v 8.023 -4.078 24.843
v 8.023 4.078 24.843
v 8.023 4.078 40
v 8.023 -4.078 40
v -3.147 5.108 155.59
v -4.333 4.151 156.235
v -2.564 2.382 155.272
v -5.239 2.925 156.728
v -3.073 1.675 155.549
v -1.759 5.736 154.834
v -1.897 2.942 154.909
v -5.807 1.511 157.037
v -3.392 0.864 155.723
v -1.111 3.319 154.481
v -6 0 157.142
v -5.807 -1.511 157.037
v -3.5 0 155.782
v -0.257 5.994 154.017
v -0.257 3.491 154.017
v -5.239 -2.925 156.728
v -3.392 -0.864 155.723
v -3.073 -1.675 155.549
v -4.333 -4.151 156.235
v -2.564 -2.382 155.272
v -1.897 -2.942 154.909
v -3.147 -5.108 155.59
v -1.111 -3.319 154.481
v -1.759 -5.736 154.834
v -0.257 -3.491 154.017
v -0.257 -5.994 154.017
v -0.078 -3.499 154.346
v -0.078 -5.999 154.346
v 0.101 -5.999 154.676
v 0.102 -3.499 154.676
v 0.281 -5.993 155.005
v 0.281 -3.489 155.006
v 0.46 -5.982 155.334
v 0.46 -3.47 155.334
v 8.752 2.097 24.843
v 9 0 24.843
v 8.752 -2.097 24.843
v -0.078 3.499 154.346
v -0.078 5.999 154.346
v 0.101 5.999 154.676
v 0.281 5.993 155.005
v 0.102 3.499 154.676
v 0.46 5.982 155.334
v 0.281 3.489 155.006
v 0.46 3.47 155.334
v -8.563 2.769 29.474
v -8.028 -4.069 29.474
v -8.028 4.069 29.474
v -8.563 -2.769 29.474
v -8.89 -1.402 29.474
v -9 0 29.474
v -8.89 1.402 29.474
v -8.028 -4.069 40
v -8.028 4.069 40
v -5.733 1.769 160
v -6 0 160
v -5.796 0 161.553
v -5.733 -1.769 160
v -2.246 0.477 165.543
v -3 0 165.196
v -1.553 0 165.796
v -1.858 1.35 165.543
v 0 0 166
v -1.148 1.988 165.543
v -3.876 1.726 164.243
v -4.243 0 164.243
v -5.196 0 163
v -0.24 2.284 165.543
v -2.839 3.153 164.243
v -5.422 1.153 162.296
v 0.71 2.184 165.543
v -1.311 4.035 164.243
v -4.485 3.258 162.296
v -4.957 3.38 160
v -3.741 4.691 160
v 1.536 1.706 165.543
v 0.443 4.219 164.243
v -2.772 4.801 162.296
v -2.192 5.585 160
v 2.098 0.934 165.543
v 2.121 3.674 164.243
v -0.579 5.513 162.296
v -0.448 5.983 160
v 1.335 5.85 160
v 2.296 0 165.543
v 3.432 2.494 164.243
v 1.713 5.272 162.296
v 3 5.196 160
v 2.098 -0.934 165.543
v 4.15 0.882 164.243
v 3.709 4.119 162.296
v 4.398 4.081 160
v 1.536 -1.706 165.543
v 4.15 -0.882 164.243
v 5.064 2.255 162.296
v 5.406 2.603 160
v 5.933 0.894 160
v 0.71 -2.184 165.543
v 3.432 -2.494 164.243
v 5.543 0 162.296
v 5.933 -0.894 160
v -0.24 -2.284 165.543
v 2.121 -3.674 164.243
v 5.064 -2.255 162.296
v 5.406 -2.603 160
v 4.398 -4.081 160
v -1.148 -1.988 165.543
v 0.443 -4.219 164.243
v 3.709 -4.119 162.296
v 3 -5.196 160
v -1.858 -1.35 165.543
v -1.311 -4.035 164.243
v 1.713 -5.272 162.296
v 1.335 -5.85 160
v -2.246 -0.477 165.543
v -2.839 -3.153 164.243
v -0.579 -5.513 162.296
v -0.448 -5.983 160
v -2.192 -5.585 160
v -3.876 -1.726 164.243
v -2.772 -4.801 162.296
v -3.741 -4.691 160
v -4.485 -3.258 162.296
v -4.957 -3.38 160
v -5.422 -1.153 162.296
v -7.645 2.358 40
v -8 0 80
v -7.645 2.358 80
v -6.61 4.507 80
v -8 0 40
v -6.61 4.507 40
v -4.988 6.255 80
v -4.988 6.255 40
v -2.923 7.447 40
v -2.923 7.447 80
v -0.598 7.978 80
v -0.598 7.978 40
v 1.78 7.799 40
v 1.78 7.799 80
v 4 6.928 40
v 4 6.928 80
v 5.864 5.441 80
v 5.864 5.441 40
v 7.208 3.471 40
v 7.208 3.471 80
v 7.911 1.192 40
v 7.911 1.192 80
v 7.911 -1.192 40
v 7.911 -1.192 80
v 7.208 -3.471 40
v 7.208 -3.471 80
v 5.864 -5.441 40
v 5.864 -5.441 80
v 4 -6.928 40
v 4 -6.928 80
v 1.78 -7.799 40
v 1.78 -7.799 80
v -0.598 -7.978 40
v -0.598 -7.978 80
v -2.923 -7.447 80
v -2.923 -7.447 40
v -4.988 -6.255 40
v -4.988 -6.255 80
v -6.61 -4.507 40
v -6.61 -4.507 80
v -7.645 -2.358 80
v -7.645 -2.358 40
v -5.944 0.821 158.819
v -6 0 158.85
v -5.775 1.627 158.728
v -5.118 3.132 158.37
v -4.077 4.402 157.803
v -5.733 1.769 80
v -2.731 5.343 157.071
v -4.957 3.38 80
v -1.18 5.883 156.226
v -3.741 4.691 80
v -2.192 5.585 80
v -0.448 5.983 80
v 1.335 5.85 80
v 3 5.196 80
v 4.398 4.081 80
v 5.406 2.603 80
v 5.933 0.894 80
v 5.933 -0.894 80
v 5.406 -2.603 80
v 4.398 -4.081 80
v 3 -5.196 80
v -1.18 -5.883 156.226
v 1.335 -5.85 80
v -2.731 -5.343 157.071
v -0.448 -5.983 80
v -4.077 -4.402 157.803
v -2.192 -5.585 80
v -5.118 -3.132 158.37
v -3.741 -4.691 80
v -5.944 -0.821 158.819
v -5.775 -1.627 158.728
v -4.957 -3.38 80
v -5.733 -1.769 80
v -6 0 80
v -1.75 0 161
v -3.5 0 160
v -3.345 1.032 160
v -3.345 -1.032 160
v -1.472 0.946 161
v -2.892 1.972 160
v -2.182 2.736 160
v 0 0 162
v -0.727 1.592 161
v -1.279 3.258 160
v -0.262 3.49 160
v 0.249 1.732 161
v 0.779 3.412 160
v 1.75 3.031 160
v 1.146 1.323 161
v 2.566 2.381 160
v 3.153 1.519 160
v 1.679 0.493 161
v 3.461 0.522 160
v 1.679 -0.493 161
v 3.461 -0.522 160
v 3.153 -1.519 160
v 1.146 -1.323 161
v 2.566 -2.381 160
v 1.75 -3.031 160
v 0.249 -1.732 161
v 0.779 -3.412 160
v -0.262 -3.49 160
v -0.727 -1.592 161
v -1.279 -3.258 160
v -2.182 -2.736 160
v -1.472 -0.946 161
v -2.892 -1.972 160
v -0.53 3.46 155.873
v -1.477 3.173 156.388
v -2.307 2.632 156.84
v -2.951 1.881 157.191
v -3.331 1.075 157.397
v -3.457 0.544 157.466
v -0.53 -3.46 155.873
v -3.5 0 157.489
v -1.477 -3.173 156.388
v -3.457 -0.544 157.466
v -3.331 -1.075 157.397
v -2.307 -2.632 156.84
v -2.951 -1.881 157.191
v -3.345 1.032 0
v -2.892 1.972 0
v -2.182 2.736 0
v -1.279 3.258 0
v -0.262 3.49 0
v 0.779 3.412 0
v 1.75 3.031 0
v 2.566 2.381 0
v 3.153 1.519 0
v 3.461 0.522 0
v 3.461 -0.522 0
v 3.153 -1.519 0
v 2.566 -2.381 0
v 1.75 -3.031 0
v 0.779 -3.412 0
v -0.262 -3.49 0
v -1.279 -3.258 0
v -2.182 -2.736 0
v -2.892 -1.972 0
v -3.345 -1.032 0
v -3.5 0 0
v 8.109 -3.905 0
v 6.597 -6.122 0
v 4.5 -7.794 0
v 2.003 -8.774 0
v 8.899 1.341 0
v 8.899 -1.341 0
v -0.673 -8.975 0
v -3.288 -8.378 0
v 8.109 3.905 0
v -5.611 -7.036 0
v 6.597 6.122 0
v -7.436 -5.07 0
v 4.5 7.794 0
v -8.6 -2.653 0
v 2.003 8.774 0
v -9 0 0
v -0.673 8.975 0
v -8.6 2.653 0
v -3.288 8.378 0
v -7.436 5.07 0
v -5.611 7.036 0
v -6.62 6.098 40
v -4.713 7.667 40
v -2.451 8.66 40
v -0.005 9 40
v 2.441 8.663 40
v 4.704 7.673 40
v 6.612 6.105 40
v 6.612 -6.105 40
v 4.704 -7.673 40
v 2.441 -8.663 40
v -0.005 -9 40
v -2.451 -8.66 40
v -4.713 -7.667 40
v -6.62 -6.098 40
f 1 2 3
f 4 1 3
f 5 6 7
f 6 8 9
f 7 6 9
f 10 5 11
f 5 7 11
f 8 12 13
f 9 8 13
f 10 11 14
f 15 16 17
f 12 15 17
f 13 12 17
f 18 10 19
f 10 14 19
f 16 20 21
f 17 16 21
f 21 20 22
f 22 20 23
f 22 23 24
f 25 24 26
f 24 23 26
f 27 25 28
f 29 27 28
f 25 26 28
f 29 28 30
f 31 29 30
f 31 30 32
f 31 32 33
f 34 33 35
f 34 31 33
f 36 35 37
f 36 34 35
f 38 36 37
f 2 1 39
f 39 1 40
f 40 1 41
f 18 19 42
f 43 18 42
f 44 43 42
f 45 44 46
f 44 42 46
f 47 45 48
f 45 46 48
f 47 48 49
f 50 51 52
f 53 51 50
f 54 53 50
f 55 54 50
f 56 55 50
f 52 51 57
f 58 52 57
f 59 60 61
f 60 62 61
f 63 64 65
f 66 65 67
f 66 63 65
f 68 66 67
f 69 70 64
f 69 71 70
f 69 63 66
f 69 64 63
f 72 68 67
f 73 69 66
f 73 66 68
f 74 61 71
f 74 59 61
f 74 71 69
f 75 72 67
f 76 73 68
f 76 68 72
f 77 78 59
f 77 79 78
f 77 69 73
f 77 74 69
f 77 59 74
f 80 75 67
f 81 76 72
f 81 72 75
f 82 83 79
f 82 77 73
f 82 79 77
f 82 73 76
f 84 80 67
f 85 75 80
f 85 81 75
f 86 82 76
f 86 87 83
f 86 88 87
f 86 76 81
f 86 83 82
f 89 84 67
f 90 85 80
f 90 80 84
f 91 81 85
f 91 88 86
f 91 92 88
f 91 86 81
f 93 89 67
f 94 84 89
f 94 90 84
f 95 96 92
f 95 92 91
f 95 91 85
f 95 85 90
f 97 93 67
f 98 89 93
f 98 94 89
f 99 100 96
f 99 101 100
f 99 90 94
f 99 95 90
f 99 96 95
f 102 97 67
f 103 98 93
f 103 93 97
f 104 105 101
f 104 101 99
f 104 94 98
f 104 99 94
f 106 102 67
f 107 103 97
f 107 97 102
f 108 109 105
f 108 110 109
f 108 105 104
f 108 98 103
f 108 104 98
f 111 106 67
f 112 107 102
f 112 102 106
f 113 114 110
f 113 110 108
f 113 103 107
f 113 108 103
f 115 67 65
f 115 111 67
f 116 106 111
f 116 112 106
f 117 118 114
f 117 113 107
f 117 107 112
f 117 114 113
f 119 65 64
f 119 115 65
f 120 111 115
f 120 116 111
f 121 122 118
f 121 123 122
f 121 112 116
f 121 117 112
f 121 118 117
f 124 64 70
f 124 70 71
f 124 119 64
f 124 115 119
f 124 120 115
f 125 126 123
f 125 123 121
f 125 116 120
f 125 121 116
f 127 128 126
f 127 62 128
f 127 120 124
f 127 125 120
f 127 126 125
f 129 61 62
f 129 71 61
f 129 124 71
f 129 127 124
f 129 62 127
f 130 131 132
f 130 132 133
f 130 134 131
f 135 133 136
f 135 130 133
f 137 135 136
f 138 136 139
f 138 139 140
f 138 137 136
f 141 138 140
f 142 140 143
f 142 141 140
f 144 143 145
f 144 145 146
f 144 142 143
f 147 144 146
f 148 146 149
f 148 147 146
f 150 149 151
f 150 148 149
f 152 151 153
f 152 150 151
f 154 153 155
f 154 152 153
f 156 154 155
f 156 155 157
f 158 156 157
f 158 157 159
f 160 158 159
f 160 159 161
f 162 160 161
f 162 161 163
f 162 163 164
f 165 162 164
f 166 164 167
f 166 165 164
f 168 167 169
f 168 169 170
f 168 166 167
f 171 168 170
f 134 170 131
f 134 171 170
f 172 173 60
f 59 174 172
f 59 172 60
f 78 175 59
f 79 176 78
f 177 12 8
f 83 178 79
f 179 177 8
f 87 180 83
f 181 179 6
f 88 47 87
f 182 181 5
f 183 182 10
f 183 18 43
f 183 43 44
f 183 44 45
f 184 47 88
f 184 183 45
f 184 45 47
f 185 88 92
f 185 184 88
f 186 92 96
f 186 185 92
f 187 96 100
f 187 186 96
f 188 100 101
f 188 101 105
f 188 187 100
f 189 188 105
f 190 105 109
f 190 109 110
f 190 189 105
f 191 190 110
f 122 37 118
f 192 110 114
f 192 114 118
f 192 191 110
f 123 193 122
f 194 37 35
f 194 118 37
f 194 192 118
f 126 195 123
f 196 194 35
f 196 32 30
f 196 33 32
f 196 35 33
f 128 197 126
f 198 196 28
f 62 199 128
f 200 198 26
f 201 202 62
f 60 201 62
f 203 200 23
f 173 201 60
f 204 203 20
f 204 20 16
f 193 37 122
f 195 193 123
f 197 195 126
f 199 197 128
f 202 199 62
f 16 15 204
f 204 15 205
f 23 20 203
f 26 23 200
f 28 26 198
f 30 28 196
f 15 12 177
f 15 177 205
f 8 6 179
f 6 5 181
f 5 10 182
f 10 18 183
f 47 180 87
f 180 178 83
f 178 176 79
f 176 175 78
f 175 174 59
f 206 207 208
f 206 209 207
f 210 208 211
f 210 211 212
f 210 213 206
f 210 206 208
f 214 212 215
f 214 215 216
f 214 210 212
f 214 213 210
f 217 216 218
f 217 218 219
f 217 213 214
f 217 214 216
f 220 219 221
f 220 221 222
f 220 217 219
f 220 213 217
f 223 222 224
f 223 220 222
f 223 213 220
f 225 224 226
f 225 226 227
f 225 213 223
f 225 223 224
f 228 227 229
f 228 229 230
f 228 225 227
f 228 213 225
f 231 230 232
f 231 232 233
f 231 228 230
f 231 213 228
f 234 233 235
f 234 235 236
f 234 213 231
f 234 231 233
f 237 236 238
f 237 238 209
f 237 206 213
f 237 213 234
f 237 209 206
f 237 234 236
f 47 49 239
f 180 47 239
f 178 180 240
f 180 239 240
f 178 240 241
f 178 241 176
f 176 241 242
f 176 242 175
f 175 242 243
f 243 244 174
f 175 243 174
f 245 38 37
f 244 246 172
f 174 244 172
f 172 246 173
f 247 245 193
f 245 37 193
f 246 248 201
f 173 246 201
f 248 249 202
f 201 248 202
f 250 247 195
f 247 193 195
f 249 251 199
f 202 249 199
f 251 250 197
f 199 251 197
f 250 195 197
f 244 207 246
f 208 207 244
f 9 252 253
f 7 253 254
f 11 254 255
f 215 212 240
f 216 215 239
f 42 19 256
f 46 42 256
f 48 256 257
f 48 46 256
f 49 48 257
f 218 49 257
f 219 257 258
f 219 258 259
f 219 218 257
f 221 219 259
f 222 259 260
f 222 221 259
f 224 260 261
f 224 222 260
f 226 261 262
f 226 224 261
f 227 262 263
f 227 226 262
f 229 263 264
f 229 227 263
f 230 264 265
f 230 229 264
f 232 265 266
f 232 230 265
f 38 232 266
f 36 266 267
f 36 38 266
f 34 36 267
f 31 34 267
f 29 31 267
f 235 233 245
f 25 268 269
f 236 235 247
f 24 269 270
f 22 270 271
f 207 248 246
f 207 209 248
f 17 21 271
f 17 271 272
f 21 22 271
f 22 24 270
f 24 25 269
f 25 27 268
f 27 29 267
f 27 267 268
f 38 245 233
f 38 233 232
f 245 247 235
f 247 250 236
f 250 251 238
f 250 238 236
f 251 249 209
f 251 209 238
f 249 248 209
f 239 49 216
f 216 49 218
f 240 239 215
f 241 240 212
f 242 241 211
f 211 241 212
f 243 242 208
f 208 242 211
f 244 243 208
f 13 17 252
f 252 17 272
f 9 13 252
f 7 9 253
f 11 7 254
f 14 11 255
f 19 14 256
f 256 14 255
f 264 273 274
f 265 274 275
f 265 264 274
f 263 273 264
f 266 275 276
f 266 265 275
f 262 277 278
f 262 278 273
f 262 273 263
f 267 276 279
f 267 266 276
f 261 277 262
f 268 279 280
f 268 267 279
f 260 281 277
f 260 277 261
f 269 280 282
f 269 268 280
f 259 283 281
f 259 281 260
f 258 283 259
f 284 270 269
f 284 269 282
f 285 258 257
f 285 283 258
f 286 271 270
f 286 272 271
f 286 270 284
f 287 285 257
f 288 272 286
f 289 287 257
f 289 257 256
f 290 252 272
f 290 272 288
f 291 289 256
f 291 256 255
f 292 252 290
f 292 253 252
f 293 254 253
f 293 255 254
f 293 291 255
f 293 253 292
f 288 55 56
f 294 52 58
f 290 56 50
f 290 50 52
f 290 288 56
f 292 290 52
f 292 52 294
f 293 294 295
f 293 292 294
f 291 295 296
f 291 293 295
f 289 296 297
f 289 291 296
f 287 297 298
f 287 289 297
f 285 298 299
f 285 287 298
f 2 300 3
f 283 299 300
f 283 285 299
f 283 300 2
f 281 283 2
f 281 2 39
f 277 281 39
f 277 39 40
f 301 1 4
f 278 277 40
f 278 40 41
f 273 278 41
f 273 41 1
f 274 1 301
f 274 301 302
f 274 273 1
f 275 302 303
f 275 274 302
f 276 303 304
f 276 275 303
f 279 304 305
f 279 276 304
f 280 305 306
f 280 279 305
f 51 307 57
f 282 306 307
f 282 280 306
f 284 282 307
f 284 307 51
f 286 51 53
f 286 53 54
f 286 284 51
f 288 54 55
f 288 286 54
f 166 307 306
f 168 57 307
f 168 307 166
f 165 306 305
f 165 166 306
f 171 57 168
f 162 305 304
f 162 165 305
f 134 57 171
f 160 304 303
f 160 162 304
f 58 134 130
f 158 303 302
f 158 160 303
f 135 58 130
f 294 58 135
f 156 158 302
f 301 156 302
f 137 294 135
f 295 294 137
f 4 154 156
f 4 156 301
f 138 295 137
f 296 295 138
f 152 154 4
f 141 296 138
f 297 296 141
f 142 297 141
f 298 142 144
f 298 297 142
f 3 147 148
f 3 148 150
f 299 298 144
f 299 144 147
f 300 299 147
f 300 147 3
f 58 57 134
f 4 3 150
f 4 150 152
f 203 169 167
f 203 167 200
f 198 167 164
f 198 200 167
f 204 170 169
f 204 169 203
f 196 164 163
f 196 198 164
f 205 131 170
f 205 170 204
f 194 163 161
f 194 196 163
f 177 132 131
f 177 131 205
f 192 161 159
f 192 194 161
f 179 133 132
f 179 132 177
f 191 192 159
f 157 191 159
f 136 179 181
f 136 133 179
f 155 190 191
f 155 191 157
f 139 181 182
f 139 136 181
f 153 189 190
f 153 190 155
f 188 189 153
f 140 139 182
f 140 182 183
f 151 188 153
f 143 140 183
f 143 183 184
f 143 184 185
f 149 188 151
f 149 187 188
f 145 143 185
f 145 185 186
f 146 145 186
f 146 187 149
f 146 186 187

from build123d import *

# Parameters (mm, degrees)
F2_W          = 3
F2_H          = 11
F3_DEPTH      = 9.001
F3_DEPTH_BACK = 9.001
F4_W          = 3
F4_H          = 16
F5_DEPTH      = 9.001
F5_DEPTH_BACK = 9.001
F7_DEPTH      = 9.001
F7_DEPTH_BACK = 9.001


with BuildPart() as f1:
    # F0 (on Front) → F1 (revolve)
    with BuildSketch(Plane.XZ):
        with BuildLine():
            Line((-9, 0), (-3.5, 0))
            Line((-3.5, 0), (-3.5, 160))
            Line((-3.5, 160), (0, 162))
            Line((0, 162), (0, 166))
            ThreePointArc((0, 166), (-4.2426406871, 164.2426406871), (-6, 160))
            Line((-6, 160), (-6, 80))
            Line((-6, 80), (-8, 80))
            Line((-8, 80), (-8, 40))
            Line((-8, 40), (-9, 40))
            Line((-9, 40), (-9, 0))
        make_face()
    revolve(axis=Axis((0, 0, 83), (0, 0, -1)))

    # F2 (on Front) → F3 (cut, two sides)
    with BuildSketch(Plane.XZ) as f3_sk:
        with Locations((-9.5278133973, 34.973811388)):
            Rectangle(F2_W, F2_H)
    extrude(amount=-F3_DEPTH, mode=Mode.SUBTRACT)
    extrude(f3_sk.sketch, amount=F3_DEPTH_BACK, mode=Mode.SUBTRACT)

    # F4 (on Front) → F5 (cut, two sides)
    with BuildSketch(Plane.XZ) as f5_sk:
        with Locations((9.5230324529, 32.8434021473)):
            Rectangle(F4_W, F4_H)
    extrude(amount=-F5_DEPTH, mode=Mode.SUBTRACT)
    extrude(f5_sk.sketch, amount=F5_DEPTH_BACK, mode=Mode.SUBTRACT)

    # F6 (on Front) → F7 (cut, two sides)
    with BuildSketch(Plane.XZ) as f7_sk:
        Polygon((-8.3235528891, 160.1148097822), (-9.0406632825, 158.7973301111), (-0.2574654756, 154.0165941548), (0.4596449178, 155.3340738258), align=None)
    extrude(amount=F7_DEPTH, mode=Mode.SUBTRACT)
    extrude(f7_sk.sketch, amount=-F7_DEPTH_BACK, mode=Mode.SUBTRACT)


solid = f1.part
